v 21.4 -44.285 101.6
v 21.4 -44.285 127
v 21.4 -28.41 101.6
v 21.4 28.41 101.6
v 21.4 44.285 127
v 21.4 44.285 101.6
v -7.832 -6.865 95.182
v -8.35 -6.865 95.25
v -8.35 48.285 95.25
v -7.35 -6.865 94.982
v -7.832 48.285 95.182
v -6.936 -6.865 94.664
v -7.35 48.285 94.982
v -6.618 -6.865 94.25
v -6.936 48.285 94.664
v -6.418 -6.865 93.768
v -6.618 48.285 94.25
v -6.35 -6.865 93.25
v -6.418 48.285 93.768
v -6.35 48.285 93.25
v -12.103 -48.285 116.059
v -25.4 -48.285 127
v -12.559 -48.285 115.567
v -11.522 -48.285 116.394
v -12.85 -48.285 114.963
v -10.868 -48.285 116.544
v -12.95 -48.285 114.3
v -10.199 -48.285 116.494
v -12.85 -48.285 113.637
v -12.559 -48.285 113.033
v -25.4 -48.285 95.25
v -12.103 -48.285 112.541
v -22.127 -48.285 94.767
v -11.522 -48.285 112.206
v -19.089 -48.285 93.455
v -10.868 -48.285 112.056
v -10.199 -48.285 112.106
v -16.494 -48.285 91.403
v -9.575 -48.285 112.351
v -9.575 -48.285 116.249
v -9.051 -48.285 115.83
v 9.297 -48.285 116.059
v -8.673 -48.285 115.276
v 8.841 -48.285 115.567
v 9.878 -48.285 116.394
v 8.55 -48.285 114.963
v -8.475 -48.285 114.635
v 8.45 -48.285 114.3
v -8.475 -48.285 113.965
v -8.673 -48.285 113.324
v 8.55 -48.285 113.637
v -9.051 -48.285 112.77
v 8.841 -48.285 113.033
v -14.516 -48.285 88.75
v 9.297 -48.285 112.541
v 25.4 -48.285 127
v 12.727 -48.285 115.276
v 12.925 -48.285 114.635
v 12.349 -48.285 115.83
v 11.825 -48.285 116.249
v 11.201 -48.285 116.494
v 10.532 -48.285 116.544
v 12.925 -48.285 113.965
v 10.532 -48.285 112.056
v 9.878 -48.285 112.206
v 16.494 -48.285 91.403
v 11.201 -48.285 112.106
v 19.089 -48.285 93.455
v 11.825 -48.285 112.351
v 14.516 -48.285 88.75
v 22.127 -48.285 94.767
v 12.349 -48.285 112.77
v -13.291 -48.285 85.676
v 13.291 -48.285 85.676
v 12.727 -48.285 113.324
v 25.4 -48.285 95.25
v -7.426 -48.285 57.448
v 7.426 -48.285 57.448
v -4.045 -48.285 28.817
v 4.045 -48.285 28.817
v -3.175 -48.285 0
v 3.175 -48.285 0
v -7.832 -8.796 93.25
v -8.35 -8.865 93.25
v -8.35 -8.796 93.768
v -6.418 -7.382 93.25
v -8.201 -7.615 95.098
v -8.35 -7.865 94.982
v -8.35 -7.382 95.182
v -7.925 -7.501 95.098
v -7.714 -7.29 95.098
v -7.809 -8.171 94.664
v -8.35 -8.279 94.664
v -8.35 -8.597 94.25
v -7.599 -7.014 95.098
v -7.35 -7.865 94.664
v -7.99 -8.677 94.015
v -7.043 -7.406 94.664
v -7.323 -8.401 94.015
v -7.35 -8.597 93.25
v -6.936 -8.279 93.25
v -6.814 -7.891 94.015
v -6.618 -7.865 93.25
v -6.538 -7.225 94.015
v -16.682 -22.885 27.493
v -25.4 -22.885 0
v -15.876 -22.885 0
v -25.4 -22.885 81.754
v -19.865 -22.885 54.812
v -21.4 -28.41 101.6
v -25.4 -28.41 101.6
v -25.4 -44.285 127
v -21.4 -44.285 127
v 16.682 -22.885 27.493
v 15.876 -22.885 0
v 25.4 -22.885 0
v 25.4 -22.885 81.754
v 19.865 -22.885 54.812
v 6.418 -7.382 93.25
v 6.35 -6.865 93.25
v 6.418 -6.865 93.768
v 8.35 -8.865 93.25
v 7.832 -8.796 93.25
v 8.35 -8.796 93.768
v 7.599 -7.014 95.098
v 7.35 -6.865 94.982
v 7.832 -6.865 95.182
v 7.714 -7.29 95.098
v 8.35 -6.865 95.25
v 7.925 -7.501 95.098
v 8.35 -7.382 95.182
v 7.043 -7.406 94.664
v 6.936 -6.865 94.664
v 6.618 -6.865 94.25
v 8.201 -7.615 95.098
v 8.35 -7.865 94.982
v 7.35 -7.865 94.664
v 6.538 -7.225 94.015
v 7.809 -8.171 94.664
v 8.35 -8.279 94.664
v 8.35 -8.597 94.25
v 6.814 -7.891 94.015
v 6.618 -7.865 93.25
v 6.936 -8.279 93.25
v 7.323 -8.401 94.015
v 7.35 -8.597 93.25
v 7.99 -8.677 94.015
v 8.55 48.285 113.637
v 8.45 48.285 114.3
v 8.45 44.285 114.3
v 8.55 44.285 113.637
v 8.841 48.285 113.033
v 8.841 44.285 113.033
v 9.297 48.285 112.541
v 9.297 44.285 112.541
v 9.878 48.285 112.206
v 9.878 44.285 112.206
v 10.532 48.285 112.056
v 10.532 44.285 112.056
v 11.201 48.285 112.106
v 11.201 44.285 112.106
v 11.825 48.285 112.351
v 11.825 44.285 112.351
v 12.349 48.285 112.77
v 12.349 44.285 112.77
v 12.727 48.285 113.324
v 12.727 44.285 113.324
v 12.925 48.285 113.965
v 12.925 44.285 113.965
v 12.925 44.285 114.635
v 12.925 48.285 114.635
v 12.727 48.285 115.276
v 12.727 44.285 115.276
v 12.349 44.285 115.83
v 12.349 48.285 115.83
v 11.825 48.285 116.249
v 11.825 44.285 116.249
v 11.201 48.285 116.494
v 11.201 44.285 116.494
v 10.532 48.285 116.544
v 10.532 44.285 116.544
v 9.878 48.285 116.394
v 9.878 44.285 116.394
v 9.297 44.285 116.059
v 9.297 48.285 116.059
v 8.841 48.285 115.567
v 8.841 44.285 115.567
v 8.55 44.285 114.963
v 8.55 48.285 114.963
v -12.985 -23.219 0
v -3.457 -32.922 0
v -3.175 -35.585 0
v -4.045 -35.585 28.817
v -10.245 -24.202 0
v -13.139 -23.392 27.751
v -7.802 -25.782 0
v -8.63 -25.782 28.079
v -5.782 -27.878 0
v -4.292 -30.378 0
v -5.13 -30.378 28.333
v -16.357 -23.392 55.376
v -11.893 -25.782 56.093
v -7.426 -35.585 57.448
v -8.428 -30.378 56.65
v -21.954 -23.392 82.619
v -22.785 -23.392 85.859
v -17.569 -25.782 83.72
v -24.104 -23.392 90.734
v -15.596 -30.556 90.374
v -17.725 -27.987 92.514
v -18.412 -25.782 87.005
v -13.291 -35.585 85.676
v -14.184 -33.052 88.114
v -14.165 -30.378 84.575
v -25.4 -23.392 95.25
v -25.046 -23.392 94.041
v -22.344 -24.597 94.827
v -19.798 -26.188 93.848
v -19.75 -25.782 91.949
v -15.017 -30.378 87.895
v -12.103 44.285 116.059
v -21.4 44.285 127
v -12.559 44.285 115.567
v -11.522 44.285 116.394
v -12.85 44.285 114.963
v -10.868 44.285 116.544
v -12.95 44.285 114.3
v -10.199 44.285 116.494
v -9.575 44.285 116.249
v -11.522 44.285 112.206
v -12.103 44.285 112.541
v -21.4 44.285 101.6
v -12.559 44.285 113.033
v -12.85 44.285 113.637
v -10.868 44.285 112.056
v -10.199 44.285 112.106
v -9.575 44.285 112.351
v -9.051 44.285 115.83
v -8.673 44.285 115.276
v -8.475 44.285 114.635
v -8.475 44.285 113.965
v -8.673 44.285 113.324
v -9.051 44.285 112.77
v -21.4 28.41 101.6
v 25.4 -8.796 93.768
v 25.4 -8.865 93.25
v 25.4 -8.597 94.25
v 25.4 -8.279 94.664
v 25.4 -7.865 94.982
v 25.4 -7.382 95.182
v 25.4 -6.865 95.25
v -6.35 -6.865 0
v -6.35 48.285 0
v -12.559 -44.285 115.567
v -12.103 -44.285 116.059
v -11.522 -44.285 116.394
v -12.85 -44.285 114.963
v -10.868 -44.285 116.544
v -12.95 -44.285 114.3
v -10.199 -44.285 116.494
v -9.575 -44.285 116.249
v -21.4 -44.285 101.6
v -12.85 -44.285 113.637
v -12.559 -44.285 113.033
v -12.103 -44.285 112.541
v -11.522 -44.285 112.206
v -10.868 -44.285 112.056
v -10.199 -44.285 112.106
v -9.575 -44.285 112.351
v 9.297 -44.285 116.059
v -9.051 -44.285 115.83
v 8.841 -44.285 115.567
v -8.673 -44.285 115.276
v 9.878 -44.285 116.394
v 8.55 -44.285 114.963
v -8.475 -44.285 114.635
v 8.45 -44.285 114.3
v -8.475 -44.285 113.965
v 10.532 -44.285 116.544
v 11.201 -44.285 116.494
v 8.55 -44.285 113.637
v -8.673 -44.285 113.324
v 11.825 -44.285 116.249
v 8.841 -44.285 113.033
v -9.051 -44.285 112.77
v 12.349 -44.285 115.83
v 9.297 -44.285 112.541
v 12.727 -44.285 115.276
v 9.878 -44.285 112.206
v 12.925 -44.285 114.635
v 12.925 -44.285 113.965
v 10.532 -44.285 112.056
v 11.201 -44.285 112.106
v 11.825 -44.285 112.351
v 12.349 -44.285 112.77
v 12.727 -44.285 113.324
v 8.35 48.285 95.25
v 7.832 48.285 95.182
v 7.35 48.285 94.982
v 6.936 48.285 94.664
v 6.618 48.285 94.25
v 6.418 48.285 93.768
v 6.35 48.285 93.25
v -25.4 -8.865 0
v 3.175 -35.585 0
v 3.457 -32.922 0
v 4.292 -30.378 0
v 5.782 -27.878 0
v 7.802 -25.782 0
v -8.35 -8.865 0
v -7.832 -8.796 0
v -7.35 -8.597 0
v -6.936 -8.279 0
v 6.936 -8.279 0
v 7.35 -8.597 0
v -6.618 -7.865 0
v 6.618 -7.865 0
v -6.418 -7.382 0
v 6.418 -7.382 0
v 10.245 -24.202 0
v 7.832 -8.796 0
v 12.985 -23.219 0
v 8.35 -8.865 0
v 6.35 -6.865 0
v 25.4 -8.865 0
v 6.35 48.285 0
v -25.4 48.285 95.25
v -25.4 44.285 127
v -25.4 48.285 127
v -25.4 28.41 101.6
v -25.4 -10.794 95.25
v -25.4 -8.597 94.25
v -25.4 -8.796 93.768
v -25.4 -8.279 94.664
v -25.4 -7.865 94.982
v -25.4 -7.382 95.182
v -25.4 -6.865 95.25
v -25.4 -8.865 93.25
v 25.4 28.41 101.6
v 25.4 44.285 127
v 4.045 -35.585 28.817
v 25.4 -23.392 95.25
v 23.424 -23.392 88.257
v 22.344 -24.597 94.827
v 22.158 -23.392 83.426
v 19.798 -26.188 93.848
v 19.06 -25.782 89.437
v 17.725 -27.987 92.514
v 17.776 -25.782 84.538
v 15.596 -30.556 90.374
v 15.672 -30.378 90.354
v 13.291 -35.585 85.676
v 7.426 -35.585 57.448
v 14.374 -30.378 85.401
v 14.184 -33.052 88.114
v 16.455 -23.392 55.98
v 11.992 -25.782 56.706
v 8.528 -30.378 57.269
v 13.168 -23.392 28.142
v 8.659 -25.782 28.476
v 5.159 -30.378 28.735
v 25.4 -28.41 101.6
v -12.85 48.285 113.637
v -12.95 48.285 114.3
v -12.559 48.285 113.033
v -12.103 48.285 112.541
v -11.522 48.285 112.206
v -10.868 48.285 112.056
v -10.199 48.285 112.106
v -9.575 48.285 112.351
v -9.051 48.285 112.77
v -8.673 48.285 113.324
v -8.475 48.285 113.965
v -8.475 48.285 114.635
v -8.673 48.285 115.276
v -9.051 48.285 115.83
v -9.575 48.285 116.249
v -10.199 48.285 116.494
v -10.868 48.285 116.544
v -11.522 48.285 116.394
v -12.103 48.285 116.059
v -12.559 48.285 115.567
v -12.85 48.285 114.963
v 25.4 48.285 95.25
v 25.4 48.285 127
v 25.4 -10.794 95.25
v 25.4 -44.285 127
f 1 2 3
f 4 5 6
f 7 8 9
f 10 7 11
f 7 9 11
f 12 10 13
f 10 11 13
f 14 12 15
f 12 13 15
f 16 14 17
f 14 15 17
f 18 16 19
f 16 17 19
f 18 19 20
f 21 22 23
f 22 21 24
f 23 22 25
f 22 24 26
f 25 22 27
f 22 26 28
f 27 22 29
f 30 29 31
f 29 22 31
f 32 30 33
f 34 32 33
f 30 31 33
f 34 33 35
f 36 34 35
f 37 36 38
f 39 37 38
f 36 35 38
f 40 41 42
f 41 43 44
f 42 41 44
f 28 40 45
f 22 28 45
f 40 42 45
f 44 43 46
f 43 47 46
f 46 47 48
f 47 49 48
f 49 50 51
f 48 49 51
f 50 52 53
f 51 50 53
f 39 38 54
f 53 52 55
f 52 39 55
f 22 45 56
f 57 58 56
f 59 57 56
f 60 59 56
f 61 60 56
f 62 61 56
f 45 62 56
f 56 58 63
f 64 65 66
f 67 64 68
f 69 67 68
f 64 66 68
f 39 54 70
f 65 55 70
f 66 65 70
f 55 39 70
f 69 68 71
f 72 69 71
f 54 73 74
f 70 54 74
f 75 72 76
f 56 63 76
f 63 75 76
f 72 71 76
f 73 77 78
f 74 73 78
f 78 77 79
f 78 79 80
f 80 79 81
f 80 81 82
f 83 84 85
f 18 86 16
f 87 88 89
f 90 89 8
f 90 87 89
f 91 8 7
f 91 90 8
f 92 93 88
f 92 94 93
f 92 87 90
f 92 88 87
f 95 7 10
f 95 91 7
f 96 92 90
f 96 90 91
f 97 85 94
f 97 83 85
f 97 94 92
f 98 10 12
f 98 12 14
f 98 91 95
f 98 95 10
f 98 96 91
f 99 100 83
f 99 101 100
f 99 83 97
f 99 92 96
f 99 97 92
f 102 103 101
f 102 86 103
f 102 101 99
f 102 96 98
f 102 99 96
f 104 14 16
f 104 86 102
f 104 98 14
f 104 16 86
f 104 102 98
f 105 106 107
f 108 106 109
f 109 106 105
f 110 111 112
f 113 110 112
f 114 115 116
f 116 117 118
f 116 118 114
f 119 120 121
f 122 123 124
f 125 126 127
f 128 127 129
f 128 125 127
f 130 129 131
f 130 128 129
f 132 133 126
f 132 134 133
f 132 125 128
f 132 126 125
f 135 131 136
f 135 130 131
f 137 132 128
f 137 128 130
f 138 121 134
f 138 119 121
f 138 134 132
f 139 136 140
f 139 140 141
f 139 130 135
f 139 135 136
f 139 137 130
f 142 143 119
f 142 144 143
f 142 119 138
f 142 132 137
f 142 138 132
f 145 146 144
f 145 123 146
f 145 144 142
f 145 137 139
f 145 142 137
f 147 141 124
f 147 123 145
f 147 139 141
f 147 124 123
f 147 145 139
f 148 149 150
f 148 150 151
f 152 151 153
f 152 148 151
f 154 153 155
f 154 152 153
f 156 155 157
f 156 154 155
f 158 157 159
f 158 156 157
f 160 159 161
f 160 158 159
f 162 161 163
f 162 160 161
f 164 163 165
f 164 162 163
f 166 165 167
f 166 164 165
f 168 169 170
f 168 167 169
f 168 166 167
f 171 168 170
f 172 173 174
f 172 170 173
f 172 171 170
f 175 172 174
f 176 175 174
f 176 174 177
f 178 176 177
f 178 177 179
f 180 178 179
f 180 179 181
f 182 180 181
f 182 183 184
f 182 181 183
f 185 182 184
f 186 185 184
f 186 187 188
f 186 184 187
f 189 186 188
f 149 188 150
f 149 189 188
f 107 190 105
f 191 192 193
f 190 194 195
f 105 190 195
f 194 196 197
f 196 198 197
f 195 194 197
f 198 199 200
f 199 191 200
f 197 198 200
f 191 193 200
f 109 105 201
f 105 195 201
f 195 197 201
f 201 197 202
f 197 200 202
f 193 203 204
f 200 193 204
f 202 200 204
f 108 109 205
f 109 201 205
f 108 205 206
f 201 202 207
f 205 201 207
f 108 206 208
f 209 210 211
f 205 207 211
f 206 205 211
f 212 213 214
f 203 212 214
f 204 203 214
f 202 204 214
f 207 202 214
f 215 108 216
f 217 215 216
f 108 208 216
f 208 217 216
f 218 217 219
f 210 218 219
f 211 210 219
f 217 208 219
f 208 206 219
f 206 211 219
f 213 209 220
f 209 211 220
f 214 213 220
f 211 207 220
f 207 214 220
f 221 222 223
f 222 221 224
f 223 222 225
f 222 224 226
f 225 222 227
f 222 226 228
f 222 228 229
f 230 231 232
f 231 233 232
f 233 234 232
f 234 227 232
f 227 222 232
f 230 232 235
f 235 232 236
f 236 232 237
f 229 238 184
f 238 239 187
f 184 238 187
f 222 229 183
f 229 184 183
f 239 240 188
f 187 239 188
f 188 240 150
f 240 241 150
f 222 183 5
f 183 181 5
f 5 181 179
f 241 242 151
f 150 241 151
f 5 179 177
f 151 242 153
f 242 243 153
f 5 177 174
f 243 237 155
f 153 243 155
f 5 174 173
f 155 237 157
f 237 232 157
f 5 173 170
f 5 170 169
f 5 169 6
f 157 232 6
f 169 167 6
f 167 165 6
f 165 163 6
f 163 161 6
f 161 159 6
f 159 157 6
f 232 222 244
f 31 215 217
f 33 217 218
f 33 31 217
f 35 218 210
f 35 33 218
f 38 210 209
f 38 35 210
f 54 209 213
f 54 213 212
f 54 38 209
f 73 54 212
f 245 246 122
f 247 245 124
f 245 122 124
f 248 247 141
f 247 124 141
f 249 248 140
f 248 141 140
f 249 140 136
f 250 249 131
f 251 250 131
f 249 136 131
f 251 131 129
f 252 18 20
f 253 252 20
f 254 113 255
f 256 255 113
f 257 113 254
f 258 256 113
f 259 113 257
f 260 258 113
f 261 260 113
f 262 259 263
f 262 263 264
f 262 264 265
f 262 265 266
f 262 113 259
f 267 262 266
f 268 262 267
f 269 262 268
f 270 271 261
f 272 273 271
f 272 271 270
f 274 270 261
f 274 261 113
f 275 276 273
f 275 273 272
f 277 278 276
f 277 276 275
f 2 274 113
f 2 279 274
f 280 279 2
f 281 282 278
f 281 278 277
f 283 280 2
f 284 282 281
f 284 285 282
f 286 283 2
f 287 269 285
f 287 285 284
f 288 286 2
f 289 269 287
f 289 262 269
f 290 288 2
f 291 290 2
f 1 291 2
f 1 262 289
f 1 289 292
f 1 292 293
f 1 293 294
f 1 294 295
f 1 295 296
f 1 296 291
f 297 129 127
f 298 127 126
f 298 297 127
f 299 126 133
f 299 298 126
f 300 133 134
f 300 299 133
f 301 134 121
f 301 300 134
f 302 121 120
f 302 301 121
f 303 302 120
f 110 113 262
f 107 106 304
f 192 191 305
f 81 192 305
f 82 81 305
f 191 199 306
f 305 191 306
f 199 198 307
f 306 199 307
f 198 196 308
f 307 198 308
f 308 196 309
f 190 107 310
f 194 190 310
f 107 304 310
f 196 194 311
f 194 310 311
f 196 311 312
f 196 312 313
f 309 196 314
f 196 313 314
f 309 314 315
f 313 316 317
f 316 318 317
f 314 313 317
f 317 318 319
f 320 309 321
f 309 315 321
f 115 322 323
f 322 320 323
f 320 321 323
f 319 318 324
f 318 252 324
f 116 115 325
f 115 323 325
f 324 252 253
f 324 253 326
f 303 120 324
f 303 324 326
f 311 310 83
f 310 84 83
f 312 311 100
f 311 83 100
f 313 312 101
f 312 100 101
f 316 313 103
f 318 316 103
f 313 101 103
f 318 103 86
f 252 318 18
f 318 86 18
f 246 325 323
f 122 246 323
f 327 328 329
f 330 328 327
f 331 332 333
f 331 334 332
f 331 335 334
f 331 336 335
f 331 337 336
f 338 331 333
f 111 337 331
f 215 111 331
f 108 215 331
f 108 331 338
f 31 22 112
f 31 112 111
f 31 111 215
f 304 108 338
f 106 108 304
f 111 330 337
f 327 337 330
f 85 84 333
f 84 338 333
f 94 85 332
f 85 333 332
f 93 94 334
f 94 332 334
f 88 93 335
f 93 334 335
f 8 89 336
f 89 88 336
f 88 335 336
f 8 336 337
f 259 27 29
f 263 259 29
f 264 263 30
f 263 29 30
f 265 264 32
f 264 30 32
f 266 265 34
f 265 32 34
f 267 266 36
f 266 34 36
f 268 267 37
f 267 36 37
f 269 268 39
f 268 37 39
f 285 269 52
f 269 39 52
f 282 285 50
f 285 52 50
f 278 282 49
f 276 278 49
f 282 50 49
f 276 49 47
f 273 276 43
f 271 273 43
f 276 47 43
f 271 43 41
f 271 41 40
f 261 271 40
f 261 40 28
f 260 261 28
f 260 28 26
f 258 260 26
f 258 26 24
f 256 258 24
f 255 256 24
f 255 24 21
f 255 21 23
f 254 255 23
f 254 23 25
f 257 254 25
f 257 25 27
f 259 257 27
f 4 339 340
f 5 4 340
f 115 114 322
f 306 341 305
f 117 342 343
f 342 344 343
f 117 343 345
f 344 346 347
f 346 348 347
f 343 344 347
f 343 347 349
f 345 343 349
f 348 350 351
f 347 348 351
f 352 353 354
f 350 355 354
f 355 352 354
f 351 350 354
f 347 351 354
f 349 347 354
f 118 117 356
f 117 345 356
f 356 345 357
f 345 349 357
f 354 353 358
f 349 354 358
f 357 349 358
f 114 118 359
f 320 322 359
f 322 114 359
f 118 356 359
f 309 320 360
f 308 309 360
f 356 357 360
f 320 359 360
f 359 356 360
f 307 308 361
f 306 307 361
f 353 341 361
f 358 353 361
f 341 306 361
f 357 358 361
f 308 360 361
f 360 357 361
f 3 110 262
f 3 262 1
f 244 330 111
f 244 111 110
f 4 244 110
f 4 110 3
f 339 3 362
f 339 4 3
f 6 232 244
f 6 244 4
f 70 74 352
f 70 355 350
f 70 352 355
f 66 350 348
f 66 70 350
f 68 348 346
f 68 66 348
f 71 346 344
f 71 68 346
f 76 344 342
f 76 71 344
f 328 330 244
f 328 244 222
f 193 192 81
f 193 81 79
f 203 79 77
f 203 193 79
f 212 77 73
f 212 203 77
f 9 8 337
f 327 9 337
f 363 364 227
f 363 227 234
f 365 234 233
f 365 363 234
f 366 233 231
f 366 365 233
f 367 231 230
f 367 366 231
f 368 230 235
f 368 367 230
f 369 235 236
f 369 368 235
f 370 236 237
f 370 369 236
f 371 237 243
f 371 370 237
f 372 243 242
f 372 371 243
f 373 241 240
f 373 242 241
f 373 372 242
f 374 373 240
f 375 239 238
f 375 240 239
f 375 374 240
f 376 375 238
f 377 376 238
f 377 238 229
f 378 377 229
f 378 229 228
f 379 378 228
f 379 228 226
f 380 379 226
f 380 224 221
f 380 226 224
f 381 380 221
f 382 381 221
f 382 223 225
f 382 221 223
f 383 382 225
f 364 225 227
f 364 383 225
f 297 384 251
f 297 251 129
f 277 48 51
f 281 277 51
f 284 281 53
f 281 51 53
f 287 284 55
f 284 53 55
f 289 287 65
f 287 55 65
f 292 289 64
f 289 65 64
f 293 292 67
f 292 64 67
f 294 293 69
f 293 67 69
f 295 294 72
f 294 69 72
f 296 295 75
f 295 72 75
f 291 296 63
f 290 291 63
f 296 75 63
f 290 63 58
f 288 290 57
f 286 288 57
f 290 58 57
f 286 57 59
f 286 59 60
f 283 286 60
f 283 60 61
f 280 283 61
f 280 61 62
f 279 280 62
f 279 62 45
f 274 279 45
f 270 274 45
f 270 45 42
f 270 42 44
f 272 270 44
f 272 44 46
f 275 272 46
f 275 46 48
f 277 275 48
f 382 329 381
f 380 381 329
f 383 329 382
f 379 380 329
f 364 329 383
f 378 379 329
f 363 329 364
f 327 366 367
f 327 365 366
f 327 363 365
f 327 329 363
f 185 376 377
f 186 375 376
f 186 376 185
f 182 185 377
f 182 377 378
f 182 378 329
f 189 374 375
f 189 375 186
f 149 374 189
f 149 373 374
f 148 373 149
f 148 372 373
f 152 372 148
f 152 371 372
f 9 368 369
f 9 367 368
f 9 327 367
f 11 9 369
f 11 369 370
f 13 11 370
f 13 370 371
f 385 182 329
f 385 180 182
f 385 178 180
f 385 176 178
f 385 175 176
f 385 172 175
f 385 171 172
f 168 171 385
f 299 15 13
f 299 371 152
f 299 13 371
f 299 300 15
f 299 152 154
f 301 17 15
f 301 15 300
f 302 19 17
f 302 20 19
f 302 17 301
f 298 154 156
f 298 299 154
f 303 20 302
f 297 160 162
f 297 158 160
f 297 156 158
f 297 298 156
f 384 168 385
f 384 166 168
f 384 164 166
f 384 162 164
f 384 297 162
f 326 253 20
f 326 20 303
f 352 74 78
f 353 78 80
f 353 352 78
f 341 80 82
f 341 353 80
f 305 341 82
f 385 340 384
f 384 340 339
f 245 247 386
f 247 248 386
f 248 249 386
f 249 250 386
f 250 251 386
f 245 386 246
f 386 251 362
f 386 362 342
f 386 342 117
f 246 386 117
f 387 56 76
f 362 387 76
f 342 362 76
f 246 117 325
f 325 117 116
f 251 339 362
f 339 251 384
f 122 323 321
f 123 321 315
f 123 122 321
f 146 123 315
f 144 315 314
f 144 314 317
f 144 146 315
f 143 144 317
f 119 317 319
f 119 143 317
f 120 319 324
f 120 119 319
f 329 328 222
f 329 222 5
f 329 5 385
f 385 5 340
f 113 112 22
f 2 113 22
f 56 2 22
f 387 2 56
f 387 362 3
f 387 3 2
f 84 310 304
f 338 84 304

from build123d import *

# Parameters (mm, degrees)
SKETCH1_W               = 50.8
SKETCH1_H               = 96.5708
BOSS_EXTRUDE1_DEPTH     = 101.6
CUT_EXTRUDE1_DEPTH      = 143.455745453
CUT_EXTRUDE1_DEPTH_BACK = 25.4
FILLET1_R               = 12.7
FILLET2_R               = 12.7
SKETCH4_W               = 50.8
SKETCH4_H               = 4
BOSS_EXTRUDE2_DEPTH     = 25.4
BOSS_EXTRUDE3_DEPTH     = 4
M4_CLEARANCE_HOLE1_D    = 4.5
MIRROR2_COPY_1_DEPTH    = 4
SKETCH10_W              = 19.05
SKETCH10_H              = 57.15
CUT_EXTRUDE2_DEPTH      = 95.25
FILLET3_R               = 2


with BuildPart() as part:
    # Sketch1 → Boss-Extrude1 (new body)
    with BuildSketch(Plane.XY):
        Rectangle(SKETCH1_W, SKETCH1_H)
    extrude(amount=BOSS_EXTRUDE1_DEPTH)

    # Sketch2 → Cut-Extrude1 (cut, two sides: drawn at the far end of the back side and taken through both)
    with BuildSketch(Plane.XZ.offset(48.2854).offset(-CUT_EXTRUDE1_DEPTH_BACK)):
        with BuildLine():
            Line((-25.4, 0), (-3.175, 0))
            ThreePointArc((-3.175, 0), (-6.041573742, 48.089456834), (-15.875, 95.25))
            Line((-15.875, 95.25), (-25.4, 95.25))
            Line((-25.4, 95.25), (-25.4, 0))
        make_face()
        with BuildLine():
            ThreePointArc((15.875, 95.25), (6.041573742, 48.089456834), (3.175, 0))
            Line((3.175, 0), (25.4, 0))
            Line((25.4, 0), (25.4, 95.25))
            Line((25.4, 95.25), (15.875, 95.25))
        make_face()
    extrude(amount=CUT_EXTRUDE1_DEPTH + CUT_EXTRUDE1_DEPTH_BACK, mode=Mode.SUBTRACT)

    # Fillet1
    fillet1_edges = [part.edges().sort_by_distance(p)[0] for p in [
        (6.041573742, -22.8854, 48.089456834),
        (-6.041573742, -22.8854, 48.089456834),
    ]]
    fillet(fillet1_edges, radius=FILLET1_R)

    # Fillet2
    # the kernel refuses this fillet: 12.7 mm, written as the material it adds along each edge
    with BuildSketch(Plane(origin=(-15.875, -48.2854, 95.25), x_dir=(-1, 0, 0), z_dir=(0, 1, 0))) as fillet2_piece_1:
        with BuildLine():
            CenterArc((9.726246489, -12.698405406), FILLET2_R, 90.90795725, 74.851551617)
            Line((-2.583504713, -9.57430148), (-2.829699737, -9.511819402))
            ThreePointArc((-2.829699737, -9.511819402), (-1.57292596, -4.711279583), (-0.244207713, 0.069846926))
            Line((-0.244207713, 0.069846926), (0, 0.254))
            ThreePointArc((0, 0.254), (4.7625, 0.254), (9.52097507, 0.253968108))
            Line((9.52097507, 0.253968108), (9.525, 0))
        make_face()
    extrude(amount=37.491851666)
    with BuildSketch(Plane(origin=(15.875, -48.2854, 95.25), x_dir=(1, 0, 0), z_dir=(0, 1, 0))) as fillet2_piece_2:
        with BuildLine():
            CenterArc((9.726246489, 12.698405406), FILLET2_R, 194.240491133, 74.851551617)
            Line((-2.583504713, 9.57430148), (-2.829699737, 9.511819402))
            ThreePointArc((-2.829699737, 9.511819402), (-1.57292596, 4.711279583), (-0.244207713, -0.069846926))
            Line((-0.244207713, -0.069846926), (0, -0.254))
            ThreePointArc((0, -0.254), (4.7625, -0.254), (9.52097507, -0.253968108))
            Line((9.52097507, -0.253968108), (9.525, 0))
        make_face()
    extrude(amount=37.491851666)

    # Sketch4 → Boss-Extrude2 (add)
    with BuildSketch(Plane.XY.offset(101.6)):
        with Locations((0, -46.2854)):
            Rectangle(SKETCH4_W, SKETCH4_H)
    boss_extrude2 = extrude(amount=BOSS_EXTRUDE2_DEPTH)

    # Sketch5 → Boss-Extrude3 (add)
    with BuildSketch(Plane(origin=(25.4, 0, 0), x_dir=(0, 0, -1), z_dir=(1, 0, 0))):
        Polygon((-101.6, -28.4104), (-127, -44.2854), (-101.6, -44.2854), align=None)
    boss_extrude3 = extrude(amount=-BOSS_EXTRUDE3_DEPTH)

    # Mirror1: Boss-Extrude3 across plane
    add(boss_extrude3.mirror(Plane(origin=(0, 0, 0), x_dir=(0, 0, 1), z_dir=(1, 0, 0))))

    # M4 Clearance Hole1 (through all)
    with Locations(Plane(origin=(0, -44.2854, 0), x_dir=(1, 0, 0), z_dir=(0, 1, 0))):
        with Locations((-10.7, -114.3), (10.7, -114.3)):
            m4_clearance_hole1 = Hole(M4_CLEARANCE_HOLE1_D / 2)

    # Mirror2: Boss-Extrude2, Boss-Extrude3, M4 Clearance Hole1 across plane
    add(boss_extrude2.mirror(Plane.ZX))
    add(boss_extrude3.mirror(Plane.ZX))
    add(m4_clearance_hole1.mirror(Plane.ZX), mode=Mode.SUBTRACT)

    # Mirror2 copy 1 sketch → Mirror2 copy 1 (add)
    with BuildSketch(Plane(origin=(-25.4, 0, 0), x_dir=(0, 0, -1), z_dir=(-1, 0, 0))):
        Polygon((-101.6, -28.4104), (-127, -44.2854), (-101.6, -44.2854), align=None)
    extrude(amount=-MIRROR2_COPY_1_DEPTH)

    # Sketch10 → Cut-Extrude2 (cut)
    with BuildSketch(Plane(origin=(0, 0, 0), x_dir=(-1, 0, 0), z_dir=(0, 0, -1))):
        with Locations((-15.875, 19.7104)):
            Rectangle(SKETCH10_W, SKETCH10_H)
        with Locations((15.875, 19.7104)):
            Rectangle(SKETCH10_W, SKETCH10_H)
    extrude(amount=-CUT_EXTRUDE2_DEPTH, mode=Mode.SUBTRACT)

    # Fillet3
    fillet3_edges = [part.edges().sort_by_distance(p)[0] for p in [
        (6.35, -8.8646, 47.625),
        (6.35, 19.7104, 95.25),
        (15.875, -8.8646, 95.25),
        (-6.35, -8.8646, 47.625),
        (-15.875, -8.8646, 95.25),
        (-6.35, 19.7104, 95.25),
    ]]
    fillet(fillet3_edges, radius=FILLET3_R)


solid = part.part
